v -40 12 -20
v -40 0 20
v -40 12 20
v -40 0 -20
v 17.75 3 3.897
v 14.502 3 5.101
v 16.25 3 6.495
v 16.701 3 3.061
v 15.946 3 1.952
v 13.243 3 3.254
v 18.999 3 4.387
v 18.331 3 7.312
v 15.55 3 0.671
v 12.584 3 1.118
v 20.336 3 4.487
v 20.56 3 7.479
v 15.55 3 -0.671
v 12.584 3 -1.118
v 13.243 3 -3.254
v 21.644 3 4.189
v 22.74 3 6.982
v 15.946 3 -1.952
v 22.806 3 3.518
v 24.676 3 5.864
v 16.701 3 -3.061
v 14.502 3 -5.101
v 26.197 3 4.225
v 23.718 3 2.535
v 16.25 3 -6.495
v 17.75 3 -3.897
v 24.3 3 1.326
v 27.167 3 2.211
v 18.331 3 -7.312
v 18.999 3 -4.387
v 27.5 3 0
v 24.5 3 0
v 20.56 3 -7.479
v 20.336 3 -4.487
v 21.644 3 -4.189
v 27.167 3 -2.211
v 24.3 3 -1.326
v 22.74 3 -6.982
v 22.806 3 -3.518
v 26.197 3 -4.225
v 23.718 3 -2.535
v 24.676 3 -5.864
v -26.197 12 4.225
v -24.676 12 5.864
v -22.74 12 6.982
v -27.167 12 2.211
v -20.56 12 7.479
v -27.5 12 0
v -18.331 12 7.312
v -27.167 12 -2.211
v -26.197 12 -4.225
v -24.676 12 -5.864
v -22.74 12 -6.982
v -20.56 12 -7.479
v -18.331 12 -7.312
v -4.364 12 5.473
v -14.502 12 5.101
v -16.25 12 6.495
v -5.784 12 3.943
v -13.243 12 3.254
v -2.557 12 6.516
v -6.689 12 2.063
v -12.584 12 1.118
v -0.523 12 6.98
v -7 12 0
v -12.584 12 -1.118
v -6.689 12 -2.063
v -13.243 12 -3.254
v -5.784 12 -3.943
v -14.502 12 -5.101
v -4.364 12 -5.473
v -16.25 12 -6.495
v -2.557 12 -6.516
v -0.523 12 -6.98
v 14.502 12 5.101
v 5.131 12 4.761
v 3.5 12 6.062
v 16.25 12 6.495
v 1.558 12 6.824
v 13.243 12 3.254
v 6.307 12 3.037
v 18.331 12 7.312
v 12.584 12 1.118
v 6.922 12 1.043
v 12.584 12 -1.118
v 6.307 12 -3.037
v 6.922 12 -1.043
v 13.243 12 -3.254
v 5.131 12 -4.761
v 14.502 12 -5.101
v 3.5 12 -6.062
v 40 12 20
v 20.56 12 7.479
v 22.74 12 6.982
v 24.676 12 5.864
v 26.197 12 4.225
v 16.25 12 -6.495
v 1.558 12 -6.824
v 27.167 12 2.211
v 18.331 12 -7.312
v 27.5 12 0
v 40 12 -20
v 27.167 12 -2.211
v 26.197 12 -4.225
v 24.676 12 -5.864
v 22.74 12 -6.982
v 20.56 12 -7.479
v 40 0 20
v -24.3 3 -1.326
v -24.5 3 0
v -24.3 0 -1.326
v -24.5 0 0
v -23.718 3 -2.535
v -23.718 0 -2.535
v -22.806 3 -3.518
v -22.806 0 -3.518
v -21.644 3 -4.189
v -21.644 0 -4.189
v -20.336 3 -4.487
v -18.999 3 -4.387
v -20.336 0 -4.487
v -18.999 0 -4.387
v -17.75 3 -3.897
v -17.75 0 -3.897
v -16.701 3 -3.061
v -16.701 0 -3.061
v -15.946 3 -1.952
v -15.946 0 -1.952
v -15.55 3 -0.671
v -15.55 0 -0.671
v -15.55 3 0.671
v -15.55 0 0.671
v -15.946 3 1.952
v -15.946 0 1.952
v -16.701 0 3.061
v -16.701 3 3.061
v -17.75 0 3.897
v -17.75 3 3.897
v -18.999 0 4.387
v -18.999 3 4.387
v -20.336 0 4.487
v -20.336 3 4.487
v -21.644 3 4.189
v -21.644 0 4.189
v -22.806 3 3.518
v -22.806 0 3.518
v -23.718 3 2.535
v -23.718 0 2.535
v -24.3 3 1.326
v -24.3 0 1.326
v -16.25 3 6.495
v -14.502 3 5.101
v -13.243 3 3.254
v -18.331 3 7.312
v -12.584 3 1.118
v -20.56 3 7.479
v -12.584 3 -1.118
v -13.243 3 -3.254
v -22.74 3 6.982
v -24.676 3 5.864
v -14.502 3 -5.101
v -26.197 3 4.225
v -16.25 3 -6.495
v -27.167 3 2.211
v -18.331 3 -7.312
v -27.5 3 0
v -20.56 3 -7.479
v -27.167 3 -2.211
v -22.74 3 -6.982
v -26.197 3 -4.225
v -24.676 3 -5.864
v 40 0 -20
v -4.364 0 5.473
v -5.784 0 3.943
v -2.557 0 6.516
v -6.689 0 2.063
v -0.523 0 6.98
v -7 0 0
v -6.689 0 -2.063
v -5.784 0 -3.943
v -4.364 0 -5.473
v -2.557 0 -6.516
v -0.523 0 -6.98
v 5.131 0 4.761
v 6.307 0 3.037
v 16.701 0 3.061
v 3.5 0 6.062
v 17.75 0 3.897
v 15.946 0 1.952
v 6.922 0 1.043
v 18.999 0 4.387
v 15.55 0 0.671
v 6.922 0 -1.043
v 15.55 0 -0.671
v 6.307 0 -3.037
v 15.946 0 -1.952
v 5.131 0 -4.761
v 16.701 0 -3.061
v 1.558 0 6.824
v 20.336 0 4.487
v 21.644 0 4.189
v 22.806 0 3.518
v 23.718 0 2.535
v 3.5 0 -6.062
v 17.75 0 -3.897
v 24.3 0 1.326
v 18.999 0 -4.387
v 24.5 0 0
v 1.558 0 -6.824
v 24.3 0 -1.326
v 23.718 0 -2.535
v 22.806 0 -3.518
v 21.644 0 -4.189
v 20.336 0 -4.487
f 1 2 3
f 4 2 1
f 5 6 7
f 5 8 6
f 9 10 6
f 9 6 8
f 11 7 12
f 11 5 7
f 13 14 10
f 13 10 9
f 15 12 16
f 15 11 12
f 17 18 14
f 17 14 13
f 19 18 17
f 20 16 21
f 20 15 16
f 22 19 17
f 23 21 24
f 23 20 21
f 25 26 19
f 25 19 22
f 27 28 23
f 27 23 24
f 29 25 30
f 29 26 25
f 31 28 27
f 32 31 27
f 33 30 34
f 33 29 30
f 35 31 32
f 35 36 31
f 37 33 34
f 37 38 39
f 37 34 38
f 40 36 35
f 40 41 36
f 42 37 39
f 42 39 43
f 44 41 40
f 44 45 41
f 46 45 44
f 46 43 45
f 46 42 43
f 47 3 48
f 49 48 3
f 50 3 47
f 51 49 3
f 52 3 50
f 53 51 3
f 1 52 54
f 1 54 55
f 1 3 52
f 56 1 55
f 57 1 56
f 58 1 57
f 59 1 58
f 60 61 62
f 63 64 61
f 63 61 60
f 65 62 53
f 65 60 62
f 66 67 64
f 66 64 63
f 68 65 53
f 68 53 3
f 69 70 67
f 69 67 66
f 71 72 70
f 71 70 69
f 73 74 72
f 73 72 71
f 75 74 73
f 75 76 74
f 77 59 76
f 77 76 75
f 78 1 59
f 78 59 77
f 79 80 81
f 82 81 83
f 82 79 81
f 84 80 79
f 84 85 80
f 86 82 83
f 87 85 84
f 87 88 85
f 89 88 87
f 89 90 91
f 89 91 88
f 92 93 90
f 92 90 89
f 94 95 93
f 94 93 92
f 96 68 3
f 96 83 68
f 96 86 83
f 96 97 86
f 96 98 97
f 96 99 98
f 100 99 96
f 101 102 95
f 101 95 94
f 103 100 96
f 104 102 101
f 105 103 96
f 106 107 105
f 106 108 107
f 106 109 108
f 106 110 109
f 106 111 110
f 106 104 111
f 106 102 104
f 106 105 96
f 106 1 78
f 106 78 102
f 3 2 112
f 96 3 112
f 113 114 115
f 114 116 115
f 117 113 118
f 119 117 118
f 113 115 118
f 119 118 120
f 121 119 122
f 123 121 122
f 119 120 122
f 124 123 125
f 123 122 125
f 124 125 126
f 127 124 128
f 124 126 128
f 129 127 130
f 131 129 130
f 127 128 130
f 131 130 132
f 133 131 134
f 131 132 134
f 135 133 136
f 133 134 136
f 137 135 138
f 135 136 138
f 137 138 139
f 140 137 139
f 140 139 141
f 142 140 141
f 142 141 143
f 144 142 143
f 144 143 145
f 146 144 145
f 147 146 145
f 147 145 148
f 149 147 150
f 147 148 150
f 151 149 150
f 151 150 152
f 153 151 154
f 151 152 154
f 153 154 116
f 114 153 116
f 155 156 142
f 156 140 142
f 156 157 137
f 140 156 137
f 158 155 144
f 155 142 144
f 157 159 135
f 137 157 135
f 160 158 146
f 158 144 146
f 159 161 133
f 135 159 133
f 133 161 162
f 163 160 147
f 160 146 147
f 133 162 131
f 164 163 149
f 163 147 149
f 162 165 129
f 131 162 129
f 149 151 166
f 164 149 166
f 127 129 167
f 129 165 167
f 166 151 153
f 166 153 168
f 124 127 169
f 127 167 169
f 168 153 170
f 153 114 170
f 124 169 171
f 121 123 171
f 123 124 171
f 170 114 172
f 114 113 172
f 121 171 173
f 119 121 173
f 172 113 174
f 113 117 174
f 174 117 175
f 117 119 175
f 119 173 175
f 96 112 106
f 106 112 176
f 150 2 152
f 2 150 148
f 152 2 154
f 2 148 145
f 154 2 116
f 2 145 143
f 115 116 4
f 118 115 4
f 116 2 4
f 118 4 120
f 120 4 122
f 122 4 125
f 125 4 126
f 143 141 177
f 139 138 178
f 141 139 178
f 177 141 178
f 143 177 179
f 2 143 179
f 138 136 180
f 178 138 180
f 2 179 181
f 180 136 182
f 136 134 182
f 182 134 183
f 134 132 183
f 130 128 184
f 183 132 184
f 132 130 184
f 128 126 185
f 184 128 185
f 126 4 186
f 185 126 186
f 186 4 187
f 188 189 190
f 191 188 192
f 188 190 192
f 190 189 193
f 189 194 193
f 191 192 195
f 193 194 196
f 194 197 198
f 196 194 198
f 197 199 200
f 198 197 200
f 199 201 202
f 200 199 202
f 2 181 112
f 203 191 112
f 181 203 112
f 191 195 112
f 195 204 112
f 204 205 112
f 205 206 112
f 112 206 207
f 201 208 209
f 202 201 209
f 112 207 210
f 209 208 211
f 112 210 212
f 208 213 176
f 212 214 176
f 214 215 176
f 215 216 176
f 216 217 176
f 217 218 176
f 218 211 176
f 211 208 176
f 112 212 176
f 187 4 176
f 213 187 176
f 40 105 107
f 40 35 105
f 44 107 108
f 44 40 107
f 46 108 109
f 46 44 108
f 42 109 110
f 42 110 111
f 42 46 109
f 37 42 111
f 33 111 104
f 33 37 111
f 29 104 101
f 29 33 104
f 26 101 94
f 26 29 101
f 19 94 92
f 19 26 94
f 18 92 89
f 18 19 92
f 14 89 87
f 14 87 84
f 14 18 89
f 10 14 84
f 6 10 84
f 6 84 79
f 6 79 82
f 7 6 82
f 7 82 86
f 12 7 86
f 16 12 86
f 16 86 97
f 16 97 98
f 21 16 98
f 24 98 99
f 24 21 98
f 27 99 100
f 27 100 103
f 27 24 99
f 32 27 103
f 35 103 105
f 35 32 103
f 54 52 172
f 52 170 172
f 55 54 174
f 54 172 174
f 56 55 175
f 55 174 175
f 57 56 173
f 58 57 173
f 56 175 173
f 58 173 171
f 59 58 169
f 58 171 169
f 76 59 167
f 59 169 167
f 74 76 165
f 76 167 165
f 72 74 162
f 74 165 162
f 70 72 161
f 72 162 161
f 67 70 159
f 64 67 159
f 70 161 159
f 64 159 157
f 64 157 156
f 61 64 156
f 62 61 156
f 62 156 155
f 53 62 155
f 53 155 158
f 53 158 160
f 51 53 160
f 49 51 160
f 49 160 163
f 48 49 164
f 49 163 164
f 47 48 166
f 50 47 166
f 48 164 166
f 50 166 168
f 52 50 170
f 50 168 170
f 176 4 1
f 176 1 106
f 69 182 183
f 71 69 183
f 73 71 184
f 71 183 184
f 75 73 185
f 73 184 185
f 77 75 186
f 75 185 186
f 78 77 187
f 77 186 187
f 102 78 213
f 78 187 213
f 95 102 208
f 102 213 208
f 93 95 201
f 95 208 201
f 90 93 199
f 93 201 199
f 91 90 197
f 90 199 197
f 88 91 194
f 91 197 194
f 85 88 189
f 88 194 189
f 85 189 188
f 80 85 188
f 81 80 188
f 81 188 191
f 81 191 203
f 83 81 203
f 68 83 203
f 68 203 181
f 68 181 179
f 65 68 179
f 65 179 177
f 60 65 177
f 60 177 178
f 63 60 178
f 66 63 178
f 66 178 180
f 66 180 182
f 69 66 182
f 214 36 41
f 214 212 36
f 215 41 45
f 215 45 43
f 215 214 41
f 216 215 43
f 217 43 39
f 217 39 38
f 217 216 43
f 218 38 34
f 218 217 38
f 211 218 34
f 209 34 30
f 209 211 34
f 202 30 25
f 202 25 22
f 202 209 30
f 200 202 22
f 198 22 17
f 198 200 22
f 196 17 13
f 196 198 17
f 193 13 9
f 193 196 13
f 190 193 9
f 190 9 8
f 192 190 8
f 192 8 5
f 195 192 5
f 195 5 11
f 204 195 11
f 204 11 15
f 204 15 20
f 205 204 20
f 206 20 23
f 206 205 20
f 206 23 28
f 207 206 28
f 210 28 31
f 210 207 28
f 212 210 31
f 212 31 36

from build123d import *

# Parameters (mm, degrees)
SKETCH_1_W             = 80
SKETCH_1_H             = 40
EXTRUDE_1_DEPTH        = 12
HOLE_WIZARD_M161_D     = 14
HOLE_WIZARD_M161_DEPTH = 12


with BuildPart() as part:
    # Эскиз1 → Бобышка-Вытянуть1 (new body)
    with BuildSketch(Plane(origin=(0, 0, 0), x_dir=(1, 0, 0), z_dir=(0, 1, 0))):
        Rectangle(SKETCH_1_W, SKETCH_1_H)
    extrude(amount=EXTRUDE_1_DEPTH)

    # Эскиз2 → Вырез-Повернуть1 (revolve, cut)
    with BuildSketch(Plane.XY):
        Polygon((-27.5, 12), (-27.5, 3), (-24.5, 3), (-24.5, 0), (-20, 0), (-20, 12), align=None)
    cut_revolve_1 = revolve(axis=Axis((-20, 12, 0), (0, -1, 0)), mode=Mode.SUBTRACT)

    # Зеркальное отражение1: Вырез-Повернуть1 across plane
    add(cut_revolve_1.mirror(Plane(origin=(0, 0, 0), x_dir=(0, 0, 1), z_dir=(1, 0, 0))), mode=Mode.SUBTRACT)

    # Отверстие обработанное метчиком M161
    with Locations(Plane(origin=(0, 12, 0), x_dir=(1, 0, 0), z_dir=(0, 1, 0))):
        with Locations((0, 0)):
            Hole(HOLE_WIZARD_M161_D / 2, depth=HOLE_WIZARD_M161_DEPTH)


solid = part.part
